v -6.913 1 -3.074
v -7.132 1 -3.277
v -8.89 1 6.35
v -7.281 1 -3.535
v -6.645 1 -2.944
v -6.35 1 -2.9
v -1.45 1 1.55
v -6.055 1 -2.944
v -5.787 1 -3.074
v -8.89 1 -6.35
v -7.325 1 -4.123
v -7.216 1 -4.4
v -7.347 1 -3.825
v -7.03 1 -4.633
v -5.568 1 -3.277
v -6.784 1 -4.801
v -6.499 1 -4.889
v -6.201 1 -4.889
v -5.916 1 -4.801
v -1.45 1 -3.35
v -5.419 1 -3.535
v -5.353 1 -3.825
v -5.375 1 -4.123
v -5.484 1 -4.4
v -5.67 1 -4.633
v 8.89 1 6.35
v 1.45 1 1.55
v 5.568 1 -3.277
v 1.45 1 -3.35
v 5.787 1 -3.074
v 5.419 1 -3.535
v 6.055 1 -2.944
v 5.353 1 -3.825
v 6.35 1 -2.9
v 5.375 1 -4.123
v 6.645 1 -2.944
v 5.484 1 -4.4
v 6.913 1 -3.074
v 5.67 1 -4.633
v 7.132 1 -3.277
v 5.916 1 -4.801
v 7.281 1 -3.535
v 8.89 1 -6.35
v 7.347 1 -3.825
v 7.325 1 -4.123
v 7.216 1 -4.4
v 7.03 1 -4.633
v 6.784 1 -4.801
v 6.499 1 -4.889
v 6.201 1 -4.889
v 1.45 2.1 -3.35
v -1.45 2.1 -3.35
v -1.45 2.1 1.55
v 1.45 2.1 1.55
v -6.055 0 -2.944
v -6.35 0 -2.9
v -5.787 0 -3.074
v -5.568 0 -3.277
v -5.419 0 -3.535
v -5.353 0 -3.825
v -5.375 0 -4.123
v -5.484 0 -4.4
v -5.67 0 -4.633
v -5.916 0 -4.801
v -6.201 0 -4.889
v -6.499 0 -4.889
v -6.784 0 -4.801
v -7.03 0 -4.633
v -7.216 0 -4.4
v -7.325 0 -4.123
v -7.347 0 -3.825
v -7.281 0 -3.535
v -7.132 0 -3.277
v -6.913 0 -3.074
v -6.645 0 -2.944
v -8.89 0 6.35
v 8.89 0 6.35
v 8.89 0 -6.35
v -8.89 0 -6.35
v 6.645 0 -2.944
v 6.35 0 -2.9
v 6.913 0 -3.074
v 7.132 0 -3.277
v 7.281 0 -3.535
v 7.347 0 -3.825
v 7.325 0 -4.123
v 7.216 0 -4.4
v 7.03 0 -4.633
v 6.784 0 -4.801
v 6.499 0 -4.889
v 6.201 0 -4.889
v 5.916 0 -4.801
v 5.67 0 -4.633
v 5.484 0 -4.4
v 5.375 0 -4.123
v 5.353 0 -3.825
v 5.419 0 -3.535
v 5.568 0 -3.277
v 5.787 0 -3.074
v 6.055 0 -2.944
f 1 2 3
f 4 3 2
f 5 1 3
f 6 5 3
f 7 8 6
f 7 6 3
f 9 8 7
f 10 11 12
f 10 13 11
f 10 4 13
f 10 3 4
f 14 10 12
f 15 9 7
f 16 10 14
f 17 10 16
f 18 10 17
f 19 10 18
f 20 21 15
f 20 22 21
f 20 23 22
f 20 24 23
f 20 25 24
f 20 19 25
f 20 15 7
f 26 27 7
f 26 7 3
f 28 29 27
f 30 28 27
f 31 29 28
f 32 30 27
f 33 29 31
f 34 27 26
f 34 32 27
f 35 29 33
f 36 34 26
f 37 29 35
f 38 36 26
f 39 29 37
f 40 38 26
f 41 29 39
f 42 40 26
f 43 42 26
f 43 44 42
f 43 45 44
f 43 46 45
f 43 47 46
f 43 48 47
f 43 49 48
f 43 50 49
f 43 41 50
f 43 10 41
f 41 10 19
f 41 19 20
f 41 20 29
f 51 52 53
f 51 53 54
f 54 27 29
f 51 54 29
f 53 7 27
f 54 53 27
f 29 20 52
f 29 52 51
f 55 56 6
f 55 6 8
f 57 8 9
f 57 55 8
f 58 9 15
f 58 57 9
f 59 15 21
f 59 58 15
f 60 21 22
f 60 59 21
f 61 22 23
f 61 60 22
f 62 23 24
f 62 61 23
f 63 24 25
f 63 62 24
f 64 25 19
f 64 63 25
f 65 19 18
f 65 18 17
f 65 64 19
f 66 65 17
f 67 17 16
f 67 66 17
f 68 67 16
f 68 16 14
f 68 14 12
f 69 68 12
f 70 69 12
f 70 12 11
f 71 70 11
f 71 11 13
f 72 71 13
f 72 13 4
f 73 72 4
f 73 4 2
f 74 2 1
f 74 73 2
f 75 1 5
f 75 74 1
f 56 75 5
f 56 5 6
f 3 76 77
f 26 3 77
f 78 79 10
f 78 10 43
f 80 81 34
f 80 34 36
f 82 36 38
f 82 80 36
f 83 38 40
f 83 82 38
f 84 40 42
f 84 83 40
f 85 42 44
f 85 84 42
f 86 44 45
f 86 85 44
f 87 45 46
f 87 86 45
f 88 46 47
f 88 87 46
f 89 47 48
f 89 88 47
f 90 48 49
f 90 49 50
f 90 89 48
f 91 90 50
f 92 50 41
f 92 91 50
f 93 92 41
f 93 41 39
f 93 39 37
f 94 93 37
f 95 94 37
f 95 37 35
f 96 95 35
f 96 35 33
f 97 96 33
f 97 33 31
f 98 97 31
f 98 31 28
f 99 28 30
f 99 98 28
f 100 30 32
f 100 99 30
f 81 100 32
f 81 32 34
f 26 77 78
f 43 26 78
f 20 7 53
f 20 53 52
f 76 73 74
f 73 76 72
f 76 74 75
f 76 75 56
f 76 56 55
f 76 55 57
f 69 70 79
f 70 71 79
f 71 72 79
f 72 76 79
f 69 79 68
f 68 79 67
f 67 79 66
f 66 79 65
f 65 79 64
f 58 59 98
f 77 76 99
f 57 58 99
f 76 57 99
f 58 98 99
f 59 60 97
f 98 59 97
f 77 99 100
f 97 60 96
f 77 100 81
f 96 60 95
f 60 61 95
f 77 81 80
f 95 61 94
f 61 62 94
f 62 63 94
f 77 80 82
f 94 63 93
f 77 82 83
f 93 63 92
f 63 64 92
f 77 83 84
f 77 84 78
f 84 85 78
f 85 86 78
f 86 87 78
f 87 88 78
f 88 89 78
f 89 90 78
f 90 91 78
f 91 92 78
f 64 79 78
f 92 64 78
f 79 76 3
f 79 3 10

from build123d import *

# Parameters (mm, degrees)
SKETCH_1_W      = 17.78
SKETCH_1_H      = 12.7
SKETCH_1_R      = 1
SKETCH_1_W_2    = 2.9
SKETCH_1_H_2    = 4.9
EXTRUDE_1_DEPTH = 1
SKETCH_1_3_W    = 2.9
SKETCH_1_3_H    = 4.9
EXTRUDE_2_DEPTH = 2.1


with BuildPart() as part:
    # 草图1 → 凸台-拉伸1 (new body)
    # profile 1 of 2: a face of its own
    with BuildSketch(Plane(origin=(0, 0, 0), x_dir=(1, 0, 0), z_dir=(0, 1, 0))):
        Rectangle(SKETCH_1_W, SKETCH_1_H)
        with Locations(Location((6.35, 3.9, 0), (0, 0, 270))):
            Circle(SKETCH_1_R, mode=Mode.SUBTRACT)
        with Locations(Location((-6.35, 3.9, 0), (0, 0, 270))):
            Circle(SKETCH_1_R, mode=Mode.SUBTRACT)
        with Locations((0, 0.9)):
            Rectangle(SKETCH_1_W_2, SKETCH_1_H_2, mode=Mode.SUBTRACT)
    # profile 2 of 2: a face of its own
    with BuildSketch(Plane(origin=(0, 0, 0), x_dir=(1, 0, 0), z_dir=(0, 1, 0))):
        with Locations((0, 0.9)):
            Rectangle(SKETCH_1_W_2, SKETCH_1_H_2)
    extrude(amount=EXTRUDE_1_DEPTH)

    # 草图1<3> → 凸台-拉伸2 (add)
    with BuildSketch(Plane(origin=(0, 0, 0), x_dir=(1, 0, 0), z_dir=(0, 1, 0))):
        with Locations((0, 0.9)):
            Rectangle(SKETCH_1_3_W, SKETCH_1_3_H)
    extrude(amount=EXTRUDE_2_DEPTH)


solid = part.part
